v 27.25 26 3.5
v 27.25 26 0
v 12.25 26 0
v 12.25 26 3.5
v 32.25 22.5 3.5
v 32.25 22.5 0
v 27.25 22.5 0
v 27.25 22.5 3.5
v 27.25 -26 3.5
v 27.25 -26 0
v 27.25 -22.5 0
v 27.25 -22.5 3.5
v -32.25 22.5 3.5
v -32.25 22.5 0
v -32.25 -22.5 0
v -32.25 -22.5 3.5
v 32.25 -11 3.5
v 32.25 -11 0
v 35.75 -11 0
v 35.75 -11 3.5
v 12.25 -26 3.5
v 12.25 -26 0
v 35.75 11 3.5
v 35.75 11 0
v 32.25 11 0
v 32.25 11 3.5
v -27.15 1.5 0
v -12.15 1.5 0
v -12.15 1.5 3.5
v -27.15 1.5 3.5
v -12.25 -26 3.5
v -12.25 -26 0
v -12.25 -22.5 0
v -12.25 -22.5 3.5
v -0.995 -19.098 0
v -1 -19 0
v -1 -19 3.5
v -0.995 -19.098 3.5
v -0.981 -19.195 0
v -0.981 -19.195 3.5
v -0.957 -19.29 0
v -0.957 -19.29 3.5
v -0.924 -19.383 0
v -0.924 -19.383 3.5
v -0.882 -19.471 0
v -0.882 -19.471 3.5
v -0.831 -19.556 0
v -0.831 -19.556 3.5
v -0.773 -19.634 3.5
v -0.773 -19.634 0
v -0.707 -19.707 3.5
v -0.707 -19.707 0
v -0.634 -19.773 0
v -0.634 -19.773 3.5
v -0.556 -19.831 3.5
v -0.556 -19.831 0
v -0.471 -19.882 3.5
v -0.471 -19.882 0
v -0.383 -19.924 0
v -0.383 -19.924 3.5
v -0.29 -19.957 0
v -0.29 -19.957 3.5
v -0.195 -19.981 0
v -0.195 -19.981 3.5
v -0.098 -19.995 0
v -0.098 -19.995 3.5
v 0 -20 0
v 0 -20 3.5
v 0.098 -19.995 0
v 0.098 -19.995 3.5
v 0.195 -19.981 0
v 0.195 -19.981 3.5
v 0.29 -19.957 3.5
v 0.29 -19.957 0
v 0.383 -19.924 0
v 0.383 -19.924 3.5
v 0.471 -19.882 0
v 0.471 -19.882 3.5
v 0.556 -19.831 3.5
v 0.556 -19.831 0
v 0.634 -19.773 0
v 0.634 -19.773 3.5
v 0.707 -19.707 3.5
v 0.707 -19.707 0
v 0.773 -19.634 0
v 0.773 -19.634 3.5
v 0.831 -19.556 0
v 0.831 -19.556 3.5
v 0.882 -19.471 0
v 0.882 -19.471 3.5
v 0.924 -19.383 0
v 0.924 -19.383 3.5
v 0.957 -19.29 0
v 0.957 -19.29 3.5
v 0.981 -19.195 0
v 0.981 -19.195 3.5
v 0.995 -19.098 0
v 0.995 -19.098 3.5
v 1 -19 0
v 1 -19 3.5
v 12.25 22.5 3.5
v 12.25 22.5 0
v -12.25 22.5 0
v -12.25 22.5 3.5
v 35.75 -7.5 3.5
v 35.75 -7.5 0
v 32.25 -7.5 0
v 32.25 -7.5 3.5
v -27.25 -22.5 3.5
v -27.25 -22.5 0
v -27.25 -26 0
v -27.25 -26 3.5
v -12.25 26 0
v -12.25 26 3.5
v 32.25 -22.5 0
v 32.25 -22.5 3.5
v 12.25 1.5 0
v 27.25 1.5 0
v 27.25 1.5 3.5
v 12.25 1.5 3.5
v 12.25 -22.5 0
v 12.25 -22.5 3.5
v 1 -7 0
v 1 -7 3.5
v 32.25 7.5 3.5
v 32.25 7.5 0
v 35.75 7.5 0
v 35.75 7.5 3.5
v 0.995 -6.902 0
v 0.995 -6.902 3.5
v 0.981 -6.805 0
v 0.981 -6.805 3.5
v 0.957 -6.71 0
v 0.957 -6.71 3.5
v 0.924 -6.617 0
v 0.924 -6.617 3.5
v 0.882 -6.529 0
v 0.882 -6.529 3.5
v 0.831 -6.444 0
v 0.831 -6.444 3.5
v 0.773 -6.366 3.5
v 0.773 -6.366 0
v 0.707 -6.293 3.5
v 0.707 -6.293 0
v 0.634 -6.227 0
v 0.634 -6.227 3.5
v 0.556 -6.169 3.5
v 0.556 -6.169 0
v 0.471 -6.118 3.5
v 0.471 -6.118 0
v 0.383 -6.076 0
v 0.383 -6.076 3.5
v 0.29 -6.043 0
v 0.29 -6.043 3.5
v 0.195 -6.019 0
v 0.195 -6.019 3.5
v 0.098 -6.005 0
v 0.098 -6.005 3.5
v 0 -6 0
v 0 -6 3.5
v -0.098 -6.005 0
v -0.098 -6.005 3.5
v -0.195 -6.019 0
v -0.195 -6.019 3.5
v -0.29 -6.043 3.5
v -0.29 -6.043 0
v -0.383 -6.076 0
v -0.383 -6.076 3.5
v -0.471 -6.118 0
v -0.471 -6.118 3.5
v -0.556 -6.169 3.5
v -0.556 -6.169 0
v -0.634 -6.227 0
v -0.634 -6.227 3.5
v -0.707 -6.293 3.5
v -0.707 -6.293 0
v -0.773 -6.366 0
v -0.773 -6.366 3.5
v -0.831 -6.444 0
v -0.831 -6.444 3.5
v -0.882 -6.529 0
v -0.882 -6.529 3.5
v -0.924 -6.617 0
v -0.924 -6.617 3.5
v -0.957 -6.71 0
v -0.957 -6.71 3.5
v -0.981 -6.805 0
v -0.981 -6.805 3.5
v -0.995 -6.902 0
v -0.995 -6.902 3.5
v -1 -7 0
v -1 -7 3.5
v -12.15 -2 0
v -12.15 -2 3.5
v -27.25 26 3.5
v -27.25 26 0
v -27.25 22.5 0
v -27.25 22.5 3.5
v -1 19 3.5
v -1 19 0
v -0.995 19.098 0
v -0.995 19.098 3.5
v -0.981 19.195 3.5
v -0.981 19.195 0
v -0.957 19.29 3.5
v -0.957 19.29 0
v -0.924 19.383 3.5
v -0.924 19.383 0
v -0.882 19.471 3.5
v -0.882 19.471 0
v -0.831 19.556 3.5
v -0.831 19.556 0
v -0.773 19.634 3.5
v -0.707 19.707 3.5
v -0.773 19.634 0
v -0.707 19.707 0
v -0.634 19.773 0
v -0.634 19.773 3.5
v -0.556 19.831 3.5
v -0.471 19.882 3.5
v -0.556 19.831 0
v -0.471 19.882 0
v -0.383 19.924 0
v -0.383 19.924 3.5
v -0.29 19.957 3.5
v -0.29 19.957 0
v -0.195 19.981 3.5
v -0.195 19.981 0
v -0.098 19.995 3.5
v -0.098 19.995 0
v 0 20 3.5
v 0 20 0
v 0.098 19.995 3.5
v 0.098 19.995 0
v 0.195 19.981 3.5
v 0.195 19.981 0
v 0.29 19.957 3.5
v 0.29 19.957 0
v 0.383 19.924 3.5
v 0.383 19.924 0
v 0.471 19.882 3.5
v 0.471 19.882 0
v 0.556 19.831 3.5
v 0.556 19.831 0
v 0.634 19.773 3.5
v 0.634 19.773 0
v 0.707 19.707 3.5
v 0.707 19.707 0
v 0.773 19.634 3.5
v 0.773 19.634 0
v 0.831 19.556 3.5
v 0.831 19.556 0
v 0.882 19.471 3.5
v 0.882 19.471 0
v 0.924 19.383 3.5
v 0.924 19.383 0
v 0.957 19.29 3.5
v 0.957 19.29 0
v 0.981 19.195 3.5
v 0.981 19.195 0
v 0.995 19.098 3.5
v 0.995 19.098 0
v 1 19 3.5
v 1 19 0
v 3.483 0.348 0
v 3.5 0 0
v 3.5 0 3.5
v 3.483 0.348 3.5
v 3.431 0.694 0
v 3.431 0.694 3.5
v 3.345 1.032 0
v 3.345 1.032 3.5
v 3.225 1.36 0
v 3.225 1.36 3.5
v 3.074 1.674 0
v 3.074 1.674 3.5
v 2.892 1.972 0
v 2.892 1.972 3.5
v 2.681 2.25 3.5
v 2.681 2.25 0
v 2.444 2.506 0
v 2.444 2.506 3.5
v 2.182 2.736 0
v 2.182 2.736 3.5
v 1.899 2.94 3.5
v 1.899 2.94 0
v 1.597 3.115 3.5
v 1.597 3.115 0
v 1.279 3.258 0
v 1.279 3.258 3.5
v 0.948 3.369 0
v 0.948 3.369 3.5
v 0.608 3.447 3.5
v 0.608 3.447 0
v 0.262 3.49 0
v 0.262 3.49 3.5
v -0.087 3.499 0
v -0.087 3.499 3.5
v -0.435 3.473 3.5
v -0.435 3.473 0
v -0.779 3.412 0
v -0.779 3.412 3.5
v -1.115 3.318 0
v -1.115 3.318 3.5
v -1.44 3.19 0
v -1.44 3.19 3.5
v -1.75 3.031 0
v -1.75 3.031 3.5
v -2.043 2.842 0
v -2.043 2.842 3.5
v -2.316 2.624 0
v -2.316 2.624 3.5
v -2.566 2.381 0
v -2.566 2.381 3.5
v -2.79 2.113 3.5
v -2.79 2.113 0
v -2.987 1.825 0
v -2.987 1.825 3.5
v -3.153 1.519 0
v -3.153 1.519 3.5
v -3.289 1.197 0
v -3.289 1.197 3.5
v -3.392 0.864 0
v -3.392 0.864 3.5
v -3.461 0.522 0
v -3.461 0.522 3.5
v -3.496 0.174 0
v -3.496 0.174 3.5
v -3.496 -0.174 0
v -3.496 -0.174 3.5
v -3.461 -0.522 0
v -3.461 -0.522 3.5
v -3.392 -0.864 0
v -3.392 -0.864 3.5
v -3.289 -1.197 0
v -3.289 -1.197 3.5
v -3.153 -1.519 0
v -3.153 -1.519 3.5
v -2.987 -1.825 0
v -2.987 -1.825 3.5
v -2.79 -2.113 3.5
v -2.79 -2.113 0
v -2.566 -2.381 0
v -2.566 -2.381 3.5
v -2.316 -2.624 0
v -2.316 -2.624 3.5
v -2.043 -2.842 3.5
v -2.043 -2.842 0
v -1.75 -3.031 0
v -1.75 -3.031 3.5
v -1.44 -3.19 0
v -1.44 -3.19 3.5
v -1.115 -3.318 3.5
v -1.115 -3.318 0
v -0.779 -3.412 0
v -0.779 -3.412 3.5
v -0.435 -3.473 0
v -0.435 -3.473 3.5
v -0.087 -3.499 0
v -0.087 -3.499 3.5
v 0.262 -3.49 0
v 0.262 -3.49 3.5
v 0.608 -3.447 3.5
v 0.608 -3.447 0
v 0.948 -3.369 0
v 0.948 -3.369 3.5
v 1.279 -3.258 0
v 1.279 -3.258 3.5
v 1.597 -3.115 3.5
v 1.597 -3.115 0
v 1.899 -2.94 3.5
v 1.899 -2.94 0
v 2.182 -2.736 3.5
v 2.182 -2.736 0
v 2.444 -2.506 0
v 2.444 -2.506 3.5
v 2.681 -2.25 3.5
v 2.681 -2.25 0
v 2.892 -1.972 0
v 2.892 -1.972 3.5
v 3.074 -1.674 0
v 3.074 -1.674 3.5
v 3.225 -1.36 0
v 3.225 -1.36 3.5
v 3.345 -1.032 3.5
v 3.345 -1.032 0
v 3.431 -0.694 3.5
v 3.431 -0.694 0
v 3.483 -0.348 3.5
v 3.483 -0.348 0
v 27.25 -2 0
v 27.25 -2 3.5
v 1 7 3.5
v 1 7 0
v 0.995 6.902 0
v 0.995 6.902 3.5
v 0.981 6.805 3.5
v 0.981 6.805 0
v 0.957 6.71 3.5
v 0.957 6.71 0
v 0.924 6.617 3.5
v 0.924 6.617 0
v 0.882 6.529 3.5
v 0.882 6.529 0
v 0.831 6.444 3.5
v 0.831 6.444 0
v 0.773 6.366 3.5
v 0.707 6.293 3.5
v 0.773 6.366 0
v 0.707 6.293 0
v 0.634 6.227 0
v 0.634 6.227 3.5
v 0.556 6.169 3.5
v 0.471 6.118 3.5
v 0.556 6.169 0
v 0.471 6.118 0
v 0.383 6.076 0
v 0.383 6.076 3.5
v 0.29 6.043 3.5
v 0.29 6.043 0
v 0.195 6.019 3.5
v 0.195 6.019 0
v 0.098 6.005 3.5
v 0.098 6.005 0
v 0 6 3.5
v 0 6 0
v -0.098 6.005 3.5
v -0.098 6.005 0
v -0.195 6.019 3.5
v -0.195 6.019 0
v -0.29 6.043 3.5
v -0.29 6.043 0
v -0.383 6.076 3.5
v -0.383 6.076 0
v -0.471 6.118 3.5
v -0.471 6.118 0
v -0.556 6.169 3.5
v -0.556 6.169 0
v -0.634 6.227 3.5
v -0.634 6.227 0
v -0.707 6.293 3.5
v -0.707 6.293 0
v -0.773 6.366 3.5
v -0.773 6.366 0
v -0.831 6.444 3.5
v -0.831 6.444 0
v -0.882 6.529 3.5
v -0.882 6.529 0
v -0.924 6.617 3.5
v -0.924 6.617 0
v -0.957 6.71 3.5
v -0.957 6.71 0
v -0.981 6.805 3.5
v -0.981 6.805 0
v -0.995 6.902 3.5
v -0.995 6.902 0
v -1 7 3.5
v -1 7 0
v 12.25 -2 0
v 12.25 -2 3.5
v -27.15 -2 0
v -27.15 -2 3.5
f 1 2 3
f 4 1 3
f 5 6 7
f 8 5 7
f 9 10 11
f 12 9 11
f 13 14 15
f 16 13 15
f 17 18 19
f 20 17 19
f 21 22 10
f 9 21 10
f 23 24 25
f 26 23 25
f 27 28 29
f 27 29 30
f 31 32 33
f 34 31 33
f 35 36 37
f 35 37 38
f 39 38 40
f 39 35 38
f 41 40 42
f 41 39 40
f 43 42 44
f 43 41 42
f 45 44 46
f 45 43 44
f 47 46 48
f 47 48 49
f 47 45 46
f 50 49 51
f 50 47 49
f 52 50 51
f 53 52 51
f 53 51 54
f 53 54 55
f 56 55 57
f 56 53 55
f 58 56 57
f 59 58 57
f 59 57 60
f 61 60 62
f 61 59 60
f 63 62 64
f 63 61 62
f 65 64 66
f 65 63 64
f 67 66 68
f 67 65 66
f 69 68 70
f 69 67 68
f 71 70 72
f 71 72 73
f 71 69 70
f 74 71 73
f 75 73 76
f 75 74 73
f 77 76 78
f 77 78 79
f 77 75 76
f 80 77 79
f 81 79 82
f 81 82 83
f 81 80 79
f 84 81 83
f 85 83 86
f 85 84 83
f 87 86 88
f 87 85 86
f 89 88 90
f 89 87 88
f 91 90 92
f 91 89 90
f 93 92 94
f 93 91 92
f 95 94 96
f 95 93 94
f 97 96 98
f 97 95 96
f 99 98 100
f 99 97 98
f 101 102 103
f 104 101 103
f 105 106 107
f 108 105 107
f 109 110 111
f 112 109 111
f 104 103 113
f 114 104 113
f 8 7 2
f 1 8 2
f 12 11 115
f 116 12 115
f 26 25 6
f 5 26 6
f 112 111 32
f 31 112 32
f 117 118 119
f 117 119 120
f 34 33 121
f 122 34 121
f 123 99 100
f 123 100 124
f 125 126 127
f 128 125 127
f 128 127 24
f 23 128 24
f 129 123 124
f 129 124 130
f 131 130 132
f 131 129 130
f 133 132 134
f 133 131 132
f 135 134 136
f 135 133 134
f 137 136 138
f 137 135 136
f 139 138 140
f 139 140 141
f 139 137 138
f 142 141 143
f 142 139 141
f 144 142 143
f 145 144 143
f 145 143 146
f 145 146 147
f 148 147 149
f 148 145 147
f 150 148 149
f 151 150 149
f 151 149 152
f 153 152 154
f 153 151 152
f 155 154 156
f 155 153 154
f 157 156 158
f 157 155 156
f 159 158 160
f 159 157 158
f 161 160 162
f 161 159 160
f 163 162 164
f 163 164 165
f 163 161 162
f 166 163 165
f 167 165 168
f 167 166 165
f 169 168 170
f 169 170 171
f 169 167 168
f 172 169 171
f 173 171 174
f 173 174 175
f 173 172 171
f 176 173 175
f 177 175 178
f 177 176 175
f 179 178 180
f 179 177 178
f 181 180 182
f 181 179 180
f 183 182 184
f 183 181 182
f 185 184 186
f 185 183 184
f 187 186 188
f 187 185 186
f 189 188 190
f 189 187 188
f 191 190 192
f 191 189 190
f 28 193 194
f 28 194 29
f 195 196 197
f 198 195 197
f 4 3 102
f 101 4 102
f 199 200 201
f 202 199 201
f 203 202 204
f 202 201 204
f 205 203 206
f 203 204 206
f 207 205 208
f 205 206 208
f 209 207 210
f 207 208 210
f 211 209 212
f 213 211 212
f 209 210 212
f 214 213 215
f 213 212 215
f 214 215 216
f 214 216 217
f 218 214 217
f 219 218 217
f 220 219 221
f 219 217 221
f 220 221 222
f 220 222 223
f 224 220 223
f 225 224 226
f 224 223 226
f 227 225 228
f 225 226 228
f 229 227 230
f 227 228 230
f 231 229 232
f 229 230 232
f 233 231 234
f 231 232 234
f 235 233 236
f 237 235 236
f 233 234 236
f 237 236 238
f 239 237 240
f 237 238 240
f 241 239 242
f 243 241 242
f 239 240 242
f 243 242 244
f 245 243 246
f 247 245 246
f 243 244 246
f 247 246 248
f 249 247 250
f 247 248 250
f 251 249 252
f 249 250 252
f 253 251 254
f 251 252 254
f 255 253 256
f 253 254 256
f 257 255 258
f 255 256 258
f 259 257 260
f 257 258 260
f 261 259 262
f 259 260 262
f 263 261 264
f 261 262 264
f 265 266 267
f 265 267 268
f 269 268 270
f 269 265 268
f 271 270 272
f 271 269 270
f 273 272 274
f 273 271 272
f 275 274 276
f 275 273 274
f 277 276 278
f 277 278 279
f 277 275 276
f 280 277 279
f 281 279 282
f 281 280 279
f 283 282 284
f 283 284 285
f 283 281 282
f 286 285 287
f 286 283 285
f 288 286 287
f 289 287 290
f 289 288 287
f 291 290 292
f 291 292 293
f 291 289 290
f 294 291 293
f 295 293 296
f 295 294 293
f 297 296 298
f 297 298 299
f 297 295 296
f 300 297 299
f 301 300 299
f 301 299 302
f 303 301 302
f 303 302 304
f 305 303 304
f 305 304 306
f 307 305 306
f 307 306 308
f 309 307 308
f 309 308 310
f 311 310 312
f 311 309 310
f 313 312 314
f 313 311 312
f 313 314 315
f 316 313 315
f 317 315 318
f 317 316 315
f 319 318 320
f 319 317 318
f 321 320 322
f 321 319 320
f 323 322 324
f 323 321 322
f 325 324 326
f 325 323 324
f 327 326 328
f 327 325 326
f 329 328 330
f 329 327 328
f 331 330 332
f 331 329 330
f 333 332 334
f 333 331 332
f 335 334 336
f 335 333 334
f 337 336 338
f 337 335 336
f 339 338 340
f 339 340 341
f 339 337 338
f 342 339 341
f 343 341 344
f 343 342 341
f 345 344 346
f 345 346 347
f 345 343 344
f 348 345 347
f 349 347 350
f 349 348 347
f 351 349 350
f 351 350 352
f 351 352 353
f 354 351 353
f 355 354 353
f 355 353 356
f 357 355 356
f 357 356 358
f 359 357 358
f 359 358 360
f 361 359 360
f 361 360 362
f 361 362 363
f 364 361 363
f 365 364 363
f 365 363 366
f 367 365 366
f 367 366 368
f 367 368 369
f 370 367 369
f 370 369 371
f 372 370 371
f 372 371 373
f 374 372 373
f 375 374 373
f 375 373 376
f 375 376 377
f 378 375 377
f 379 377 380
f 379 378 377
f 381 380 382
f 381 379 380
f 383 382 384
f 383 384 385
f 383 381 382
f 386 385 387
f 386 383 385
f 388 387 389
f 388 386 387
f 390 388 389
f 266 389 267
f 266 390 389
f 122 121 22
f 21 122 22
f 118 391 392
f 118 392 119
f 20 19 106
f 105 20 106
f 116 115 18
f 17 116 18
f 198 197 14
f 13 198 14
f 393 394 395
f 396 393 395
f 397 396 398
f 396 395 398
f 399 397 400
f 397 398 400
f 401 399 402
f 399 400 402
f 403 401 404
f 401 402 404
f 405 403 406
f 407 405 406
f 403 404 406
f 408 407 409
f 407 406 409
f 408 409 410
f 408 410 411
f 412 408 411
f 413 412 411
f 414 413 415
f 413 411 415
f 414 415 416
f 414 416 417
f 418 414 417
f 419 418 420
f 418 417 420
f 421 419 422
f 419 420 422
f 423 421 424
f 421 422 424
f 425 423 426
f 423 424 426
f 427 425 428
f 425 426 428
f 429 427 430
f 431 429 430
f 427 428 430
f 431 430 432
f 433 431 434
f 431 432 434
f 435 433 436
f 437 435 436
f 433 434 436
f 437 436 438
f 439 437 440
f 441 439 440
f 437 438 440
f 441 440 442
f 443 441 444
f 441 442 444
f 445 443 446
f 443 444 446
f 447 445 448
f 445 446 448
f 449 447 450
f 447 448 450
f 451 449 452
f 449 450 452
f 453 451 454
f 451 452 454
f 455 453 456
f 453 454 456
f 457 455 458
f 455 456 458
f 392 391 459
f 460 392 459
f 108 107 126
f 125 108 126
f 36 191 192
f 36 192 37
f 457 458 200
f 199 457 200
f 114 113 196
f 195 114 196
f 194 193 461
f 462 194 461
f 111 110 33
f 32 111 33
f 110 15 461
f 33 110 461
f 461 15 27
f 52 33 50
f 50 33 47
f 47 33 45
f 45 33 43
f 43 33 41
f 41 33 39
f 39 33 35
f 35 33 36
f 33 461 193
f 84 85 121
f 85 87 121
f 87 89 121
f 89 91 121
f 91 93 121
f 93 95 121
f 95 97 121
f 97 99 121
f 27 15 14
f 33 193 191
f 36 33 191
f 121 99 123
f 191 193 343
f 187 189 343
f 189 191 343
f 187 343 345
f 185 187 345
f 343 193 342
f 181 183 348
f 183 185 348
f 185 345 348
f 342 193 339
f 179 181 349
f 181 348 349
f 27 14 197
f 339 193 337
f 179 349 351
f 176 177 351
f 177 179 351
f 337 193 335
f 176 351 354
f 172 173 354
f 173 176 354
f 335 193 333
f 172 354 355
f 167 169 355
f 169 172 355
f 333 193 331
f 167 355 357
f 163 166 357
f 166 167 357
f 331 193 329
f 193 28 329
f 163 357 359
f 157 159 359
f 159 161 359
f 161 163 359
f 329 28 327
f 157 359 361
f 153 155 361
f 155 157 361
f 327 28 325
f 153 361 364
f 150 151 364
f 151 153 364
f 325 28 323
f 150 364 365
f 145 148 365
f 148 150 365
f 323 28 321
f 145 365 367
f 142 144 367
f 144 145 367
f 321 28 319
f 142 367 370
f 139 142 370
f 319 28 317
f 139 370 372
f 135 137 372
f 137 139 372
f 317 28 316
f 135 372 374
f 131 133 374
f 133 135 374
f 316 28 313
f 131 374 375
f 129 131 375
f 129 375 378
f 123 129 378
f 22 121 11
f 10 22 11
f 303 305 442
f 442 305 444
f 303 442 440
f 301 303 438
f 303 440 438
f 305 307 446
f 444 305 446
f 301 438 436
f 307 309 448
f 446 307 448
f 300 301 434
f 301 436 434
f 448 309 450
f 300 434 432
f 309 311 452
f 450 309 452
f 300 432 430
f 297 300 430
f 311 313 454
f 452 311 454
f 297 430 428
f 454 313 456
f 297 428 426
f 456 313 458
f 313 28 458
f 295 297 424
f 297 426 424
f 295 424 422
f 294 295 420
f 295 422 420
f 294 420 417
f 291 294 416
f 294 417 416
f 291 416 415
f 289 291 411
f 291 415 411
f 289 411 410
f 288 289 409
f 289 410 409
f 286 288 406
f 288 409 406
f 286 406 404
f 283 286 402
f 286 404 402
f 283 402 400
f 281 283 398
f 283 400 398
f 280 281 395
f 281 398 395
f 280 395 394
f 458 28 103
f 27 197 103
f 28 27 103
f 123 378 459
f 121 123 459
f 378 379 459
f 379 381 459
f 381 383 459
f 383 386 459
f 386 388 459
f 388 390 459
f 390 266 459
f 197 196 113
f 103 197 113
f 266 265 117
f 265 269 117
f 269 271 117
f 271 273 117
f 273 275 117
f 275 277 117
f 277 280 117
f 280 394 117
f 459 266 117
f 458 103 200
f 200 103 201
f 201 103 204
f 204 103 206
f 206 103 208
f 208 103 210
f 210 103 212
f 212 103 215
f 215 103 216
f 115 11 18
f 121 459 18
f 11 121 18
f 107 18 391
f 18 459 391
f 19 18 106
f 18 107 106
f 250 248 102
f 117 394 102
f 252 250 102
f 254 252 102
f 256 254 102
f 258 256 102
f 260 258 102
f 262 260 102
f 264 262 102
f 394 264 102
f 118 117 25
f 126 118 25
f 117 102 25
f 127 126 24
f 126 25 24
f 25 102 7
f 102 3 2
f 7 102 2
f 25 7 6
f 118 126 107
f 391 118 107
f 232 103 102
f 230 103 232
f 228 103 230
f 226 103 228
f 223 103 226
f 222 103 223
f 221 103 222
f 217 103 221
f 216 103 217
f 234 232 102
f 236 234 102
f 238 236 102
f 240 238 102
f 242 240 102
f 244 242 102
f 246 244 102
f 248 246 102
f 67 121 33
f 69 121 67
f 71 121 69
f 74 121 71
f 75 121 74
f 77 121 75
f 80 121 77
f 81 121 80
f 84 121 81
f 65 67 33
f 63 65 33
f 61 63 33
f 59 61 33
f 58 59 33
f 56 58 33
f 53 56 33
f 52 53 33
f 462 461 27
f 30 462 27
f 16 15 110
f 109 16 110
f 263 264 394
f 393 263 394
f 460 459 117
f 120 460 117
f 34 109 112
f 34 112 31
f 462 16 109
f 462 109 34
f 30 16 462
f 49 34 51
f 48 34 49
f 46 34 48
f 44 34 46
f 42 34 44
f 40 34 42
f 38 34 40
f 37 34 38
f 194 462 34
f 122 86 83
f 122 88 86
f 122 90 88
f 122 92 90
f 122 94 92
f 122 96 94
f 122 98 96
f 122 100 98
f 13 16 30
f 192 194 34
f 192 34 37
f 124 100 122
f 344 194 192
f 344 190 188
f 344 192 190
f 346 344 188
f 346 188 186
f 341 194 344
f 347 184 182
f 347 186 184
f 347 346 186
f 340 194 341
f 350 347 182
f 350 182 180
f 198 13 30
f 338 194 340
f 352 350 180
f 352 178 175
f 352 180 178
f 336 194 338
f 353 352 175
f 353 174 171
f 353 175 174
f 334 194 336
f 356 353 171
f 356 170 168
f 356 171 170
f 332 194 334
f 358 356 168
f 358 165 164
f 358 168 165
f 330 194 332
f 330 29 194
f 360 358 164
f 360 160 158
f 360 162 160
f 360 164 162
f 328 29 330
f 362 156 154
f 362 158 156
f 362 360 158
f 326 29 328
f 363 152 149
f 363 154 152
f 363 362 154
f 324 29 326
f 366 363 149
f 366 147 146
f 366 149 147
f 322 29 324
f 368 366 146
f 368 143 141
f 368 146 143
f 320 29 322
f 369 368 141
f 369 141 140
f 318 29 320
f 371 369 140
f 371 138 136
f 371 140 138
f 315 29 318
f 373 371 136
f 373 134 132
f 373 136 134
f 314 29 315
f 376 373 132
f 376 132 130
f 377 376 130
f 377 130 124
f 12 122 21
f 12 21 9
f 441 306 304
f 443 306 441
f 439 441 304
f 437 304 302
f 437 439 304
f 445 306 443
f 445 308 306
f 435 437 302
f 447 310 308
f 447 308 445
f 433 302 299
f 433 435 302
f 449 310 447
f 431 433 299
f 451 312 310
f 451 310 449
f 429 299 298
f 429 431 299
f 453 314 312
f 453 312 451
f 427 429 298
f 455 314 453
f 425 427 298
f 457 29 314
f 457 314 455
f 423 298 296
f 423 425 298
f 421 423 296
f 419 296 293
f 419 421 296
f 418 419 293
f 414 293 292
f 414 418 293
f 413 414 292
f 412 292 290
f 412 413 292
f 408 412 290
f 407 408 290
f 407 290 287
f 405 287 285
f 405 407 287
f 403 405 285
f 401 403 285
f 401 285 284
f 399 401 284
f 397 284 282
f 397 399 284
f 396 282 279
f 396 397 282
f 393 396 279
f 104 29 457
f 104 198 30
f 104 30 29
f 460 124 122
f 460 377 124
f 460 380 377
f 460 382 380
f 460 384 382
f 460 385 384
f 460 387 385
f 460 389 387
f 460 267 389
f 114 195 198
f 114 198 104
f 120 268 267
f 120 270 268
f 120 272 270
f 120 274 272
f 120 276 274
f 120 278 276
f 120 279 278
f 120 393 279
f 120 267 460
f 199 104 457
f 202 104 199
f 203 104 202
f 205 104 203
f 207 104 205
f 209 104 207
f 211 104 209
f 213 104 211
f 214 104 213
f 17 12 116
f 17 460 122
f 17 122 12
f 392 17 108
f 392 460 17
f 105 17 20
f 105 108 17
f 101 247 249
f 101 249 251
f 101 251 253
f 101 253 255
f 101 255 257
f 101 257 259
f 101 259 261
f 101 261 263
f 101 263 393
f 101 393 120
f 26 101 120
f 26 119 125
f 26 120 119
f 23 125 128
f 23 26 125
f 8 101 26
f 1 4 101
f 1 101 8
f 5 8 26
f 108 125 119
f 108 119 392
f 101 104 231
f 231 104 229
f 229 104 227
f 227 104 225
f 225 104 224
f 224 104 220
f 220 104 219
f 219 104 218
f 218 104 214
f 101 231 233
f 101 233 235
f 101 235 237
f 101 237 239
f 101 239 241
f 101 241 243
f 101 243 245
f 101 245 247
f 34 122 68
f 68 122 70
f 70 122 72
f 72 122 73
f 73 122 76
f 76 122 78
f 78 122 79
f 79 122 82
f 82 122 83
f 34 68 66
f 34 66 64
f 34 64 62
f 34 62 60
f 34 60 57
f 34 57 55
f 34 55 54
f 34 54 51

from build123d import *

# Parameters (mm, degrees)
SKETCH1_R           = 3.5
BOSS_EXTRUDE1_DEPTH = 3.5
SKETCH2_W           = 15
SKETCH2_H           = 3.5
CUT_EXTRUDE1_DEPTH  = 45.343122353


with BuildPart() as part:
    # Sketch1 → Boss-Extrude1 (new body)
    with BuildSketch(Plane.XY):
        Polygon((27.25, -26), (27.25, -22.5), (32.25, -22.5), (32.25, -11), (35.75, -11), (35.75, -7.5), (32.25, -7.5), (32.25, 7.5), (35.75, 7.5), (35.75, 11), (32.25, 11), (32.25, 22.5), (27.25, 22.5), (27.25, 26), (12.25, 26), (12.25, 22.5), (-12.25, 22.5), (-12.25, 26), (-27.25, 26), (-27.25, 22.5), (-32.25, 22.5), (-32.25, -22.5), (-27.25, -22.5), (-27.25, -26), (-12.25, -26), (-12.25, -22.5), (12.25, -22.5), (12.25, -26), align=None)
        Circle(SKETCH1_R, mode=Mode.SUBTRACT)
        with BuildLine():
            Line((1, 19), (1, 7))
            ThreePointArc((1, 7), (0, 6), (-1, 7))
            Line((-1, 7), (-1, 19))
            ThreePointArc((-1, 19), (0, 20), (1, 19))
        make_face(mode=Mode.SUBTRACT)
        with BuildLine():
            Line((1, -19), (1, -7))
            ThreePointArc((1, -7), (0, -6), (-1, -7))
            Line((-1, -7), (-1, -19))
            ThreePointArc((-1, -19), (0, -20), (1, -19))
        make_face(mode=Mode.SUBTRACT)
    extrude(amount=BOSS_EXTRUDE1_DEPTH)

    # Sketch2 → Cut-Extrude1 (cut, through all)
    with BuildSketch(Plane(origin=(0, 0, 0), x_dir=(-1, 0, 0), z_dir=(0, 0, -1))):
        with Locations((19.65, -0.25)):
            Rectangle(SKETCH2_W, SKETCH2_H)
        with Locations((-19.75, -0.25)):
            Rectangle(SKETCH2_W, SKETCH2_H)
    extrude(amount=-CUT_EXTRUDE1_DEPTH, mode=Mode.SUBTRACT)


solid = part.part
